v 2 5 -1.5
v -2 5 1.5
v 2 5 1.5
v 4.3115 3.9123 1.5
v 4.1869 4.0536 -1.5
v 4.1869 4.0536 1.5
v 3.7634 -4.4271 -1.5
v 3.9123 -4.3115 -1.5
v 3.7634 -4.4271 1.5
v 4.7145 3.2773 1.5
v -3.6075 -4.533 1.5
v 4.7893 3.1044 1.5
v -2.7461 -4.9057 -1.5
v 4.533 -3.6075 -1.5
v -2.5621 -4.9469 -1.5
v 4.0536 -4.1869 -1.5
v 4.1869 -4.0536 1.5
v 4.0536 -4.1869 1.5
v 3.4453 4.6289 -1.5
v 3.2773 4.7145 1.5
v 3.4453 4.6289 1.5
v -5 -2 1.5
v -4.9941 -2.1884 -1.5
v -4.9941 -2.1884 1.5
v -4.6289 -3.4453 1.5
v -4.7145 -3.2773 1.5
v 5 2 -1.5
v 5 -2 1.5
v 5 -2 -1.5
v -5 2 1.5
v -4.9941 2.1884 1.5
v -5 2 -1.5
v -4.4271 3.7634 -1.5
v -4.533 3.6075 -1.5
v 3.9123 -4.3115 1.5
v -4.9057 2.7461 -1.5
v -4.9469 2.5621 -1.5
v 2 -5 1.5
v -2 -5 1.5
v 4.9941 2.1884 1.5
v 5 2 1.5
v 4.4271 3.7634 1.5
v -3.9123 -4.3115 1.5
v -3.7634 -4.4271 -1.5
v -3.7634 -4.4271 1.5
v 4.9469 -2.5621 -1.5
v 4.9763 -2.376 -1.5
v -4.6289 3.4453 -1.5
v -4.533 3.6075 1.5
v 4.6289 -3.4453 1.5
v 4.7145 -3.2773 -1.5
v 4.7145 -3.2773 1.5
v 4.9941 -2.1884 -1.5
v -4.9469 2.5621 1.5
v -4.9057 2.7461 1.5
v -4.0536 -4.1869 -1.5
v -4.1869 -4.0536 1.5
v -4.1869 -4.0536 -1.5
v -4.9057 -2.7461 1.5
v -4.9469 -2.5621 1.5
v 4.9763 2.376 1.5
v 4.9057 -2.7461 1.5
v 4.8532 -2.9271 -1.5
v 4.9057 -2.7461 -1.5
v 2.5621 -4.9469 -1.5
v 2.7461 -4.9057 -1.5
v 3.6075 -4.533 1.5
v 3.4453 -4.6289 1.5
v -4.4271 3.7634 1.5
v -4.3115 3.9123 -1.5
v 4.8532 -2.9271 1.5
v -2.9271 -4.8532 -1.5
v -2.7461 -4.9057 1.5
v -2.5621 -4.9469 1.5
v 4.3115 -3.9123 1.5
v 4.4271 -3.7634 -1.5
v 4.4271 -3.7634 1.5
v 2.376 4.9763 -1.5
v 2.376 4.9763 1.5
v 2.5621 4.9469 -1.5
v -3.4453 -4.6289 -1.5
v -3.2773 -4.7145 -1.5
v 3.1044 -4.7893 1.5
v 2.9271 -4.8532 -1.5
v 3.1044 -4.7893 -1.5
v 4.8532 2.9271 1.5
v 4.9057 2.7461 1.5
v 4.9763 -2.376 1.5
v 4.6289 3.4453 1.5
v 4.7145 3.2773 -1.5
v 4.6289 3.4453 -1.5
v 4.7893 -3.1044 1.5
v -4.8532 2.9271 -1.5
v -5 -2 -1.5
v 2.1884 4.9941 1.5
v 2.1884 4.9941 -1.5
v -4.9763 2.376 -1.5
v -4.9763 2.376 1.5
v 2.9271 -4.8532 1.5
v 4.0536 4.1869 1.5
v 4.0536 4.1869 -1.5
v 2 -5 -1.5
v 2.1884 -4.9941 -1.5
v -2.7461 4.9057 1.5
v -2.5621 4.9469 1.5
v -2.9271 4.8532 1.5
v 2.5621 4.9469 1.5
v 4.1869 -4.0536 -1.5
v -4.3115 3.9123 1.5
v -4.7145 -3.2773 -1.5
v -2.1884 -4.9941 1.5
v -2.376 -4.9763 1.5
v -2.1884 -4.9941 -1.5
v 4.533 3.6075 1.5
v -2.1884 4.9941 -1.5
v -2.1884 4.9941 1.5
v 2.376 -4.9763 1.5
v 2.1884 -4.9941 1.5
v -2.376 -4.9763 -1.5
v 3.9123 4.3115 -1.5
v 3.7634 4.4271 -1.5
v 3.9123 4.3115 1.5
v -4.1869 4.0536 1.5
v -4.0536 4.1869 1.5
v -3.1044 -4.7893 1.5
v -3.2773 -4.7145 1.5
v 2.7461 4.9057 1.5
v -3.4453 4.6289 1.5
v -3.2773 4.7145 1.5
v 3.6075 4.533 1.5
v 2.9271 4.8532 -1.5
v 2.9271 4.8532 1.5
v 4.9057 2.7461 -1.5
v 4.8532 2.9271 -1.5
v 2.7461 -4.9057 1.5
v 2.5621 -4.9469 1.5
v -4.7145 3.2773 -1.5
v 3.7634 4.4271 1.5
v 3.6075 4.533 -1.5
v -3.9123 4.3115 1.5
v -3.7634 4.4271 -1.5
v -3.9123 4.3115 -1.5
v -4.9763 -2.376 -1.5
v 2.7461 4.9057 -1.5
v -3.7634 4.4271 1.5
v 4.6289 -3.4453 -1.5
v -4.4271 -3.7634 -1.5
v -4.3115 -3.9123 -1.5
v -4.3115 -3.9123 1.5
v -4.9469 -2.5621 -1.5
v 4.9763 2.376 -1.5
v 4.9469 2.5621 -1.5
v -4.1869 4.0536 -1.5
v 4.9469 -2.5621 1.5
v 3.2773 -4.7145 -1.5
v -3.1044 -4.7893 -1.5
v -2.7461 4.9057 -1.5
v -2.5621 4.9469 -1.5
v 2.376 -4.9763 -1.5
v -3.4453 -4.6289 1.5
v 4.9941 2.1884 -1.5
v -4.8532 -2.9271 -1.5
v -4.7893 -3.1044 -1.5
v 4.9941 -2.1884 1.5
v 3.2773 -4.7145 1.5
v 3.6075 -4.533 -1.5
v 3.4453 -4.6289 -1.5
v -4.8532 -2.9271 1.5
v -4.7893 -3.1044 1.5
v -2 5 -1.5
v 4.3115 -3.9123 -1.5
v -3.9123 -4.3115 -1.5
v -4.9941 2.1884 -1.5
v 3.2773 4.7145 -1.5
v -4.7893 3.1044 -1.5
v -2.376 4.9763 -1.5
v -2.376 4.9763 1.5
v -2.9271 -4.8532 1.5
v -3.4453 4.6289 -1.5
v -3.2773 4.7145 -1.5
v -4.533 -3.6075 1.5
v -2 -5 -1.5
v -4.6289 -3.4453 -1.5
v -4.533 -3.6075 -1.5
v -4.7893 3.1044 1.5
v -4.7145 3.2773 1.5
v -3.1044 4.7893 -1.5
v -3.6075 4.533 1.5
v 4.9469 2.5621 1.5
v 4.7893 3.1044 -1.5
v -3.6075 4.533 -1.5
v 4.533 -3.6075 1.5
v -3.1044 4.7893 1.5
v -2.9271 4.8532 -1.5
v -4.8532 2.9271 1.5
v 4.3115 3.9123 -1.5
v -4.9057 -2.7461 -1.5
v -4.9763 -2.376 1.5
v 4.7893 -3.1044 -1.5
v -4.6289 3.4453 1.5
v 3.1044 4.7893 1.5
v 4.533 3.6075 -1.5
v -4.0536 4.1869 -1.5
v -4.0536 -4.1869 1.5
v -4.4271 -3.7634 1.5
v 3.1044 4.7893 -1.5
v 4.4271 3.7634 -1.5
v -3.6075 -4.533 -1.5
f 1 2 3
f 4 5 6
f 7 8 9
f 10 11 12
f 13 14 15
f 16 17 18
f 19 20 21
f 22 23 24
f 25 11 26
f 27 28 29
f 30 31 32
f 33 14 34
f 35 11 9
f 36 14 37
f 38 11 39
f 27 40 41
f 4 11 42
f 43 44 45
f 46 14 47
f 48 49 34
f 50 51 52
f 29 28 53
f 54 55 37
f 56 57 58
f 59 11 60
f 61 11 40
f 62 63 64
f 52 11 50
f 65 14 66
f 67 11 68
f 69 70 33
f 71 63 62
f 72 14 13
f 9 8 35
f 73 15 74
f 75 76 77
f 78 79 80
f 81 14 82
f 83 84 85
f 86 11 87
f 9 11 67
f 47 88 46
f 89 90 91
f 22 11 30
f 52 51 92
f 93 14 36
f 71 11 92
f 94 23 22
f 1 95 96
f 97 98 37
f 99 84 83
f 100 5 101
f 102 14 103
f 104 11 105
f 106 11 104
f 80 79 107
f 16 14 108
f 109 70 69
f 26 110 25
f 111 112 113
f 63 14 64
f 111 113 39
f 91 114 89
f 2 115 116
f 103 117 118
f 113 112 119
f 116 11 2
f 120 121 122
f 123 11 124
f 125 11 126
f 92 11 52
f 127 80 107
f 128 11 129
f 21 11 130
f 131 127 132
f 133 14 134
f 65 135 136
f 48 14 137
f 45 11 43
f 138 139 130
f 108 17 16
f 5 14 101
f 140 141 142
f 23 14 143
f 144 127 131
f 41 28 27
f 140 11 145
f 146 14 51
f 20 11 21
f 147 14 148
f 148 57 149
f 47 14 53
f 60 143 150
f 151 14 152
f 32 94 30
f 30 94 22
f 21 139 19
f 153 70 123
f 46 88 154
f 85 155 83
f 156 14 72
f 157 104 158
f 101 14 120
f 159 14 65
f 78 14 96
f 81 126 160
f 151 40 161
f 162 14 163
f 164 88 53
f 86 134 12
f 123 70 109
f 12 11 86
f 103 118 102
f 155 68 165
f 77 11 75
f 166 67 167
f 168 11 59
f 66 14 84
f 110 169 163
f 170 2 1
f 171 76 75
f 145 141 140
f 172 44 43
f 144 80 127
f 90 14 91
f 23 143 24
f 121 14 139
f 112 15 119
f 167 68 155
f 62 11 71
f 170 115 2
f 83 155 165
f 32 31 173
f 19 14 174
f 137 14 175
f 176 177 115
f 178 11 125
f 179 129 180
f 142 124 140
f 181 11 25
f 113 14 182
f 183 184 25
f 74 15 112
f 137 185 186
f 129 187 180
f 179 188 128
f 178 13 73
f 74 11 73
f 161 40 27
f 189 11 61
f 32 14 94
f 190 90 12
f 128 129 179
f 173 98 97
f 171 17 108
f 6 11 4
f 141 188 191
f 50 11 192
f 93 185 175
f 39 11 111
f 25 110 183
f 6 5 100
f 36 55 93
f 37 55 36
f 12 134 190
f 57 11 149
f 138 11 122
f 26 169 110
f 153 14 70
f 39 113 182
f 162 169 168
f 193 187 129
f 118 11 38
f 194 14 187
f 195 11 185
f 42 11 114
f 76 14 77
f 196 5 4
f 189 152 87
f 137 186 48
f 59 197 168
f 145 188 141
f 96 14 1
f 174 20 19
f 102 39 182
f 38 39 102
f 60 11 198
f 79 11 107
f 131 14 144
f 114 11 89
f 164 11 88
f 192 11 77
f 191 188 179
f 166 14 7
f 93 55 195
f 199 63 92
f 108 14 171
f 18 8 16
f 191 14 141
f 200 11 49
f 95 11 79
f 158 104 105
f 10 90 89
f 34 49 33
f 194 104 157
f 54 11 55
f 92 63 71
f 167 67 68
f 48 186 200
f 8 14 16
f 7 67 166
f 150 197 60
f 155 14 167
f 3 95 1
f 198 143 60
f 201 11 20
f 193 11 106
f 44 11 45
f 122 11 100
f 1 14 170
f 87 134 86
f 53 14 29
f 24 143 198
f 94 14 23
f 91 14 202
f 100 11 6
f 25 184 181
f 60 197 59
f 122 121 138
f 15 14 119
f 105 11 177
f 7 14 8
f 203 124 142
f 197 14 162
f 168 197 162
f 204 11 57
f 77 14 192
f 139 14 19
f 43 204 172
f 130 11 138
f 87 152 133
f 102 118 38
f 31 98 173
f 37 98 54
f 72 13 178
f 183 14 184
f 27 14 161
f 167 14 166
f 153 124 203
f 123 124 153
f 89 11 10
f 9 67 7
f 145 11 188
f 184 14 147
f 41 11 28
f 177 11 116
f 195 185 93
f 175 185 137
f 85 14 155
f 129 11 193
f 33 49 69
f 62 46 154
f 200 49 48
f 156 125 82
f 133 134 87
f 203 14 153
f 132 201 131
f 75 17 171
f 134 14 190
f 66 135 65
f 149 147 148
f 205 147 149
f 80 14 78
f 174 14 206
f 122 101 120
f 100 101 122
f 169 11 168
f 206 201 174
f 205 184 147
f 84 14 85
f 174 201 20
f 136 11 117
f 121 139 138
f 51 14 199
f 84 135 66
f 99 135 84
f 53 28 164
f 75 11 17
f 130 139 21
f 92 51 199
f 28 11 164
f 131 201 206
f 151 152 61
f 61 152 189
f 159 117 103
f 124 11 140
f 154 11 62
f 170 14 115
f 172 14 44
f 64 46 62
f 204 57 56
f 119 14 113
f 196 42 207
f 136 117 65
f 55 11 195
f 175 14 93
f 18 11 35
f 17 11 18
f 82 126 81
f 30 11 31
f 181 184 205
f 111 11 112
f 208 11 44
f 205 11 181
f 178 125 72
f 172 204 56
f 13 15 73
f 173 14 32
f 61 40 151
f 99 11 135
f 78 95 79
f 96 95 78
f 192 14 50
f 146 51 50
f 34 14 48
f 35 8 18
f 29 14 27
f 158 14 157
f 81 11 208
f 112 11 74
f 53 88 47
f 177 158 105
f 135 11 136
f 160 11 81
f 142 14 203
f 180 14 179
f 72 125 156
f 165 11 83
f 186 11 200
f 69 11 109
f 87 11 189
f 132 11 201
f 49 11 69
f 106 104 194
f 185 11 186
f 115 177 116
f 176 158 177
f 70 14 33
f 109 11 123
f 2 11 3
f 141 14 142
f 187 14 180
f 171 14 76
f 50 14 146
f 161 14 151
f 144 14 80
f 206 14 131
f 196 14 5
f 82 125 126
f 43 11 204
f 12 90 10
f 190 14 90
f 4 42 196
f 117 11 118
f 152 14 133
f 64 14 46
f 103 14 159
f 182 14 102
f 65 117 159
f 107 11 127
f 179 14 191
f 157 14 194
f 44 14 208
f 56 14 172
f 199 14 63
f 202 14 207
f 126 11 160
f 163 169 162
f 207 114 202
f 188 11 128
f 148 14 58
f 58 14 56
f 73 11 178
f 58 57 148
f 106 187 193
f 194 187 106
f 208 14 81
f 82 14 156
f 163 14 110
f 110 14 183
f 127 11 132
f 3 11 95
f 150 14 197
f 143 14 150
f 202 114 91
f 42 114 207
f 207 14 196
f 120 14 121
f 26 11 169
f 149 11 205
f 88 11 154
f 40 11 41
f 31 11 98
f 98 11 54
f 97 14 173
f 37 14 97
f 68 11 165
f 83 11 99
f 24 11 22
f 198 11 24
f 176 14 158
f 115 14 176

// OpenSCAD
// This work is licensed under a Creative Commons Attribution-ShareAlike 4.0 International License (http://creativecommons.org/licenses/by-sa/4.0/)

module round_cube(dimensions, radius, center=false) {
    if (center) {
        translate([0, 0, -0.5]) _round_cube(dimensions, radius, center);
    } else {
        translate([radius, radius, 0]) _round_cube(dimensions, radius);
    }
}

module _round_cube(dimensions, radius, center=false) {
        minkowski() {
            cube([dimensions[0] - radius*2, dimensions[1] - radius*2, dimensions[2] - 1], center=center);
            cylinder(r=radius,h=1);
        }
}


module hollow_cylinder(height, externalDiameter, internalDiameter) {
    difference() {
        cylinder(height, r=externalDiameter/2);
        translate([0, 0, -1]) cylinder(height + 2, r=internalDiameter/2);
    }
}

module screw_hole(screwDiameter, headDiameter, depth, headDepth) {    
    translate([0, 0, -depth]) cylinder(h=4 * depth, r=screwDiameter / 2);
    translate([0, 0, depth - headDepth]) cylinder(h=4 * depth, r=headDiameter / 2);
}

module cylinder_sector(diameter, startAngle, endAngle) {
    cylinder(h=height, d=diameter);
}

$fn=100;
size=10;
distance=0;

round_cube(dimensions=[10,10,3], radius=3);
!round_cube(dimensions=[10,10,3], radius=3, center=true);
hollow_cylinder(height=3, externalDiameter=10, internalDiameter=7);
difference() { cube([10, 10, 3]); translate([5, 5, 0]) screw_hole(screwDiameter=3, headDiameter=6, depth=3, headDepth=1); }
cylinder_sector(height=3, diameter=10, startAngle=0, endAngle=180);
